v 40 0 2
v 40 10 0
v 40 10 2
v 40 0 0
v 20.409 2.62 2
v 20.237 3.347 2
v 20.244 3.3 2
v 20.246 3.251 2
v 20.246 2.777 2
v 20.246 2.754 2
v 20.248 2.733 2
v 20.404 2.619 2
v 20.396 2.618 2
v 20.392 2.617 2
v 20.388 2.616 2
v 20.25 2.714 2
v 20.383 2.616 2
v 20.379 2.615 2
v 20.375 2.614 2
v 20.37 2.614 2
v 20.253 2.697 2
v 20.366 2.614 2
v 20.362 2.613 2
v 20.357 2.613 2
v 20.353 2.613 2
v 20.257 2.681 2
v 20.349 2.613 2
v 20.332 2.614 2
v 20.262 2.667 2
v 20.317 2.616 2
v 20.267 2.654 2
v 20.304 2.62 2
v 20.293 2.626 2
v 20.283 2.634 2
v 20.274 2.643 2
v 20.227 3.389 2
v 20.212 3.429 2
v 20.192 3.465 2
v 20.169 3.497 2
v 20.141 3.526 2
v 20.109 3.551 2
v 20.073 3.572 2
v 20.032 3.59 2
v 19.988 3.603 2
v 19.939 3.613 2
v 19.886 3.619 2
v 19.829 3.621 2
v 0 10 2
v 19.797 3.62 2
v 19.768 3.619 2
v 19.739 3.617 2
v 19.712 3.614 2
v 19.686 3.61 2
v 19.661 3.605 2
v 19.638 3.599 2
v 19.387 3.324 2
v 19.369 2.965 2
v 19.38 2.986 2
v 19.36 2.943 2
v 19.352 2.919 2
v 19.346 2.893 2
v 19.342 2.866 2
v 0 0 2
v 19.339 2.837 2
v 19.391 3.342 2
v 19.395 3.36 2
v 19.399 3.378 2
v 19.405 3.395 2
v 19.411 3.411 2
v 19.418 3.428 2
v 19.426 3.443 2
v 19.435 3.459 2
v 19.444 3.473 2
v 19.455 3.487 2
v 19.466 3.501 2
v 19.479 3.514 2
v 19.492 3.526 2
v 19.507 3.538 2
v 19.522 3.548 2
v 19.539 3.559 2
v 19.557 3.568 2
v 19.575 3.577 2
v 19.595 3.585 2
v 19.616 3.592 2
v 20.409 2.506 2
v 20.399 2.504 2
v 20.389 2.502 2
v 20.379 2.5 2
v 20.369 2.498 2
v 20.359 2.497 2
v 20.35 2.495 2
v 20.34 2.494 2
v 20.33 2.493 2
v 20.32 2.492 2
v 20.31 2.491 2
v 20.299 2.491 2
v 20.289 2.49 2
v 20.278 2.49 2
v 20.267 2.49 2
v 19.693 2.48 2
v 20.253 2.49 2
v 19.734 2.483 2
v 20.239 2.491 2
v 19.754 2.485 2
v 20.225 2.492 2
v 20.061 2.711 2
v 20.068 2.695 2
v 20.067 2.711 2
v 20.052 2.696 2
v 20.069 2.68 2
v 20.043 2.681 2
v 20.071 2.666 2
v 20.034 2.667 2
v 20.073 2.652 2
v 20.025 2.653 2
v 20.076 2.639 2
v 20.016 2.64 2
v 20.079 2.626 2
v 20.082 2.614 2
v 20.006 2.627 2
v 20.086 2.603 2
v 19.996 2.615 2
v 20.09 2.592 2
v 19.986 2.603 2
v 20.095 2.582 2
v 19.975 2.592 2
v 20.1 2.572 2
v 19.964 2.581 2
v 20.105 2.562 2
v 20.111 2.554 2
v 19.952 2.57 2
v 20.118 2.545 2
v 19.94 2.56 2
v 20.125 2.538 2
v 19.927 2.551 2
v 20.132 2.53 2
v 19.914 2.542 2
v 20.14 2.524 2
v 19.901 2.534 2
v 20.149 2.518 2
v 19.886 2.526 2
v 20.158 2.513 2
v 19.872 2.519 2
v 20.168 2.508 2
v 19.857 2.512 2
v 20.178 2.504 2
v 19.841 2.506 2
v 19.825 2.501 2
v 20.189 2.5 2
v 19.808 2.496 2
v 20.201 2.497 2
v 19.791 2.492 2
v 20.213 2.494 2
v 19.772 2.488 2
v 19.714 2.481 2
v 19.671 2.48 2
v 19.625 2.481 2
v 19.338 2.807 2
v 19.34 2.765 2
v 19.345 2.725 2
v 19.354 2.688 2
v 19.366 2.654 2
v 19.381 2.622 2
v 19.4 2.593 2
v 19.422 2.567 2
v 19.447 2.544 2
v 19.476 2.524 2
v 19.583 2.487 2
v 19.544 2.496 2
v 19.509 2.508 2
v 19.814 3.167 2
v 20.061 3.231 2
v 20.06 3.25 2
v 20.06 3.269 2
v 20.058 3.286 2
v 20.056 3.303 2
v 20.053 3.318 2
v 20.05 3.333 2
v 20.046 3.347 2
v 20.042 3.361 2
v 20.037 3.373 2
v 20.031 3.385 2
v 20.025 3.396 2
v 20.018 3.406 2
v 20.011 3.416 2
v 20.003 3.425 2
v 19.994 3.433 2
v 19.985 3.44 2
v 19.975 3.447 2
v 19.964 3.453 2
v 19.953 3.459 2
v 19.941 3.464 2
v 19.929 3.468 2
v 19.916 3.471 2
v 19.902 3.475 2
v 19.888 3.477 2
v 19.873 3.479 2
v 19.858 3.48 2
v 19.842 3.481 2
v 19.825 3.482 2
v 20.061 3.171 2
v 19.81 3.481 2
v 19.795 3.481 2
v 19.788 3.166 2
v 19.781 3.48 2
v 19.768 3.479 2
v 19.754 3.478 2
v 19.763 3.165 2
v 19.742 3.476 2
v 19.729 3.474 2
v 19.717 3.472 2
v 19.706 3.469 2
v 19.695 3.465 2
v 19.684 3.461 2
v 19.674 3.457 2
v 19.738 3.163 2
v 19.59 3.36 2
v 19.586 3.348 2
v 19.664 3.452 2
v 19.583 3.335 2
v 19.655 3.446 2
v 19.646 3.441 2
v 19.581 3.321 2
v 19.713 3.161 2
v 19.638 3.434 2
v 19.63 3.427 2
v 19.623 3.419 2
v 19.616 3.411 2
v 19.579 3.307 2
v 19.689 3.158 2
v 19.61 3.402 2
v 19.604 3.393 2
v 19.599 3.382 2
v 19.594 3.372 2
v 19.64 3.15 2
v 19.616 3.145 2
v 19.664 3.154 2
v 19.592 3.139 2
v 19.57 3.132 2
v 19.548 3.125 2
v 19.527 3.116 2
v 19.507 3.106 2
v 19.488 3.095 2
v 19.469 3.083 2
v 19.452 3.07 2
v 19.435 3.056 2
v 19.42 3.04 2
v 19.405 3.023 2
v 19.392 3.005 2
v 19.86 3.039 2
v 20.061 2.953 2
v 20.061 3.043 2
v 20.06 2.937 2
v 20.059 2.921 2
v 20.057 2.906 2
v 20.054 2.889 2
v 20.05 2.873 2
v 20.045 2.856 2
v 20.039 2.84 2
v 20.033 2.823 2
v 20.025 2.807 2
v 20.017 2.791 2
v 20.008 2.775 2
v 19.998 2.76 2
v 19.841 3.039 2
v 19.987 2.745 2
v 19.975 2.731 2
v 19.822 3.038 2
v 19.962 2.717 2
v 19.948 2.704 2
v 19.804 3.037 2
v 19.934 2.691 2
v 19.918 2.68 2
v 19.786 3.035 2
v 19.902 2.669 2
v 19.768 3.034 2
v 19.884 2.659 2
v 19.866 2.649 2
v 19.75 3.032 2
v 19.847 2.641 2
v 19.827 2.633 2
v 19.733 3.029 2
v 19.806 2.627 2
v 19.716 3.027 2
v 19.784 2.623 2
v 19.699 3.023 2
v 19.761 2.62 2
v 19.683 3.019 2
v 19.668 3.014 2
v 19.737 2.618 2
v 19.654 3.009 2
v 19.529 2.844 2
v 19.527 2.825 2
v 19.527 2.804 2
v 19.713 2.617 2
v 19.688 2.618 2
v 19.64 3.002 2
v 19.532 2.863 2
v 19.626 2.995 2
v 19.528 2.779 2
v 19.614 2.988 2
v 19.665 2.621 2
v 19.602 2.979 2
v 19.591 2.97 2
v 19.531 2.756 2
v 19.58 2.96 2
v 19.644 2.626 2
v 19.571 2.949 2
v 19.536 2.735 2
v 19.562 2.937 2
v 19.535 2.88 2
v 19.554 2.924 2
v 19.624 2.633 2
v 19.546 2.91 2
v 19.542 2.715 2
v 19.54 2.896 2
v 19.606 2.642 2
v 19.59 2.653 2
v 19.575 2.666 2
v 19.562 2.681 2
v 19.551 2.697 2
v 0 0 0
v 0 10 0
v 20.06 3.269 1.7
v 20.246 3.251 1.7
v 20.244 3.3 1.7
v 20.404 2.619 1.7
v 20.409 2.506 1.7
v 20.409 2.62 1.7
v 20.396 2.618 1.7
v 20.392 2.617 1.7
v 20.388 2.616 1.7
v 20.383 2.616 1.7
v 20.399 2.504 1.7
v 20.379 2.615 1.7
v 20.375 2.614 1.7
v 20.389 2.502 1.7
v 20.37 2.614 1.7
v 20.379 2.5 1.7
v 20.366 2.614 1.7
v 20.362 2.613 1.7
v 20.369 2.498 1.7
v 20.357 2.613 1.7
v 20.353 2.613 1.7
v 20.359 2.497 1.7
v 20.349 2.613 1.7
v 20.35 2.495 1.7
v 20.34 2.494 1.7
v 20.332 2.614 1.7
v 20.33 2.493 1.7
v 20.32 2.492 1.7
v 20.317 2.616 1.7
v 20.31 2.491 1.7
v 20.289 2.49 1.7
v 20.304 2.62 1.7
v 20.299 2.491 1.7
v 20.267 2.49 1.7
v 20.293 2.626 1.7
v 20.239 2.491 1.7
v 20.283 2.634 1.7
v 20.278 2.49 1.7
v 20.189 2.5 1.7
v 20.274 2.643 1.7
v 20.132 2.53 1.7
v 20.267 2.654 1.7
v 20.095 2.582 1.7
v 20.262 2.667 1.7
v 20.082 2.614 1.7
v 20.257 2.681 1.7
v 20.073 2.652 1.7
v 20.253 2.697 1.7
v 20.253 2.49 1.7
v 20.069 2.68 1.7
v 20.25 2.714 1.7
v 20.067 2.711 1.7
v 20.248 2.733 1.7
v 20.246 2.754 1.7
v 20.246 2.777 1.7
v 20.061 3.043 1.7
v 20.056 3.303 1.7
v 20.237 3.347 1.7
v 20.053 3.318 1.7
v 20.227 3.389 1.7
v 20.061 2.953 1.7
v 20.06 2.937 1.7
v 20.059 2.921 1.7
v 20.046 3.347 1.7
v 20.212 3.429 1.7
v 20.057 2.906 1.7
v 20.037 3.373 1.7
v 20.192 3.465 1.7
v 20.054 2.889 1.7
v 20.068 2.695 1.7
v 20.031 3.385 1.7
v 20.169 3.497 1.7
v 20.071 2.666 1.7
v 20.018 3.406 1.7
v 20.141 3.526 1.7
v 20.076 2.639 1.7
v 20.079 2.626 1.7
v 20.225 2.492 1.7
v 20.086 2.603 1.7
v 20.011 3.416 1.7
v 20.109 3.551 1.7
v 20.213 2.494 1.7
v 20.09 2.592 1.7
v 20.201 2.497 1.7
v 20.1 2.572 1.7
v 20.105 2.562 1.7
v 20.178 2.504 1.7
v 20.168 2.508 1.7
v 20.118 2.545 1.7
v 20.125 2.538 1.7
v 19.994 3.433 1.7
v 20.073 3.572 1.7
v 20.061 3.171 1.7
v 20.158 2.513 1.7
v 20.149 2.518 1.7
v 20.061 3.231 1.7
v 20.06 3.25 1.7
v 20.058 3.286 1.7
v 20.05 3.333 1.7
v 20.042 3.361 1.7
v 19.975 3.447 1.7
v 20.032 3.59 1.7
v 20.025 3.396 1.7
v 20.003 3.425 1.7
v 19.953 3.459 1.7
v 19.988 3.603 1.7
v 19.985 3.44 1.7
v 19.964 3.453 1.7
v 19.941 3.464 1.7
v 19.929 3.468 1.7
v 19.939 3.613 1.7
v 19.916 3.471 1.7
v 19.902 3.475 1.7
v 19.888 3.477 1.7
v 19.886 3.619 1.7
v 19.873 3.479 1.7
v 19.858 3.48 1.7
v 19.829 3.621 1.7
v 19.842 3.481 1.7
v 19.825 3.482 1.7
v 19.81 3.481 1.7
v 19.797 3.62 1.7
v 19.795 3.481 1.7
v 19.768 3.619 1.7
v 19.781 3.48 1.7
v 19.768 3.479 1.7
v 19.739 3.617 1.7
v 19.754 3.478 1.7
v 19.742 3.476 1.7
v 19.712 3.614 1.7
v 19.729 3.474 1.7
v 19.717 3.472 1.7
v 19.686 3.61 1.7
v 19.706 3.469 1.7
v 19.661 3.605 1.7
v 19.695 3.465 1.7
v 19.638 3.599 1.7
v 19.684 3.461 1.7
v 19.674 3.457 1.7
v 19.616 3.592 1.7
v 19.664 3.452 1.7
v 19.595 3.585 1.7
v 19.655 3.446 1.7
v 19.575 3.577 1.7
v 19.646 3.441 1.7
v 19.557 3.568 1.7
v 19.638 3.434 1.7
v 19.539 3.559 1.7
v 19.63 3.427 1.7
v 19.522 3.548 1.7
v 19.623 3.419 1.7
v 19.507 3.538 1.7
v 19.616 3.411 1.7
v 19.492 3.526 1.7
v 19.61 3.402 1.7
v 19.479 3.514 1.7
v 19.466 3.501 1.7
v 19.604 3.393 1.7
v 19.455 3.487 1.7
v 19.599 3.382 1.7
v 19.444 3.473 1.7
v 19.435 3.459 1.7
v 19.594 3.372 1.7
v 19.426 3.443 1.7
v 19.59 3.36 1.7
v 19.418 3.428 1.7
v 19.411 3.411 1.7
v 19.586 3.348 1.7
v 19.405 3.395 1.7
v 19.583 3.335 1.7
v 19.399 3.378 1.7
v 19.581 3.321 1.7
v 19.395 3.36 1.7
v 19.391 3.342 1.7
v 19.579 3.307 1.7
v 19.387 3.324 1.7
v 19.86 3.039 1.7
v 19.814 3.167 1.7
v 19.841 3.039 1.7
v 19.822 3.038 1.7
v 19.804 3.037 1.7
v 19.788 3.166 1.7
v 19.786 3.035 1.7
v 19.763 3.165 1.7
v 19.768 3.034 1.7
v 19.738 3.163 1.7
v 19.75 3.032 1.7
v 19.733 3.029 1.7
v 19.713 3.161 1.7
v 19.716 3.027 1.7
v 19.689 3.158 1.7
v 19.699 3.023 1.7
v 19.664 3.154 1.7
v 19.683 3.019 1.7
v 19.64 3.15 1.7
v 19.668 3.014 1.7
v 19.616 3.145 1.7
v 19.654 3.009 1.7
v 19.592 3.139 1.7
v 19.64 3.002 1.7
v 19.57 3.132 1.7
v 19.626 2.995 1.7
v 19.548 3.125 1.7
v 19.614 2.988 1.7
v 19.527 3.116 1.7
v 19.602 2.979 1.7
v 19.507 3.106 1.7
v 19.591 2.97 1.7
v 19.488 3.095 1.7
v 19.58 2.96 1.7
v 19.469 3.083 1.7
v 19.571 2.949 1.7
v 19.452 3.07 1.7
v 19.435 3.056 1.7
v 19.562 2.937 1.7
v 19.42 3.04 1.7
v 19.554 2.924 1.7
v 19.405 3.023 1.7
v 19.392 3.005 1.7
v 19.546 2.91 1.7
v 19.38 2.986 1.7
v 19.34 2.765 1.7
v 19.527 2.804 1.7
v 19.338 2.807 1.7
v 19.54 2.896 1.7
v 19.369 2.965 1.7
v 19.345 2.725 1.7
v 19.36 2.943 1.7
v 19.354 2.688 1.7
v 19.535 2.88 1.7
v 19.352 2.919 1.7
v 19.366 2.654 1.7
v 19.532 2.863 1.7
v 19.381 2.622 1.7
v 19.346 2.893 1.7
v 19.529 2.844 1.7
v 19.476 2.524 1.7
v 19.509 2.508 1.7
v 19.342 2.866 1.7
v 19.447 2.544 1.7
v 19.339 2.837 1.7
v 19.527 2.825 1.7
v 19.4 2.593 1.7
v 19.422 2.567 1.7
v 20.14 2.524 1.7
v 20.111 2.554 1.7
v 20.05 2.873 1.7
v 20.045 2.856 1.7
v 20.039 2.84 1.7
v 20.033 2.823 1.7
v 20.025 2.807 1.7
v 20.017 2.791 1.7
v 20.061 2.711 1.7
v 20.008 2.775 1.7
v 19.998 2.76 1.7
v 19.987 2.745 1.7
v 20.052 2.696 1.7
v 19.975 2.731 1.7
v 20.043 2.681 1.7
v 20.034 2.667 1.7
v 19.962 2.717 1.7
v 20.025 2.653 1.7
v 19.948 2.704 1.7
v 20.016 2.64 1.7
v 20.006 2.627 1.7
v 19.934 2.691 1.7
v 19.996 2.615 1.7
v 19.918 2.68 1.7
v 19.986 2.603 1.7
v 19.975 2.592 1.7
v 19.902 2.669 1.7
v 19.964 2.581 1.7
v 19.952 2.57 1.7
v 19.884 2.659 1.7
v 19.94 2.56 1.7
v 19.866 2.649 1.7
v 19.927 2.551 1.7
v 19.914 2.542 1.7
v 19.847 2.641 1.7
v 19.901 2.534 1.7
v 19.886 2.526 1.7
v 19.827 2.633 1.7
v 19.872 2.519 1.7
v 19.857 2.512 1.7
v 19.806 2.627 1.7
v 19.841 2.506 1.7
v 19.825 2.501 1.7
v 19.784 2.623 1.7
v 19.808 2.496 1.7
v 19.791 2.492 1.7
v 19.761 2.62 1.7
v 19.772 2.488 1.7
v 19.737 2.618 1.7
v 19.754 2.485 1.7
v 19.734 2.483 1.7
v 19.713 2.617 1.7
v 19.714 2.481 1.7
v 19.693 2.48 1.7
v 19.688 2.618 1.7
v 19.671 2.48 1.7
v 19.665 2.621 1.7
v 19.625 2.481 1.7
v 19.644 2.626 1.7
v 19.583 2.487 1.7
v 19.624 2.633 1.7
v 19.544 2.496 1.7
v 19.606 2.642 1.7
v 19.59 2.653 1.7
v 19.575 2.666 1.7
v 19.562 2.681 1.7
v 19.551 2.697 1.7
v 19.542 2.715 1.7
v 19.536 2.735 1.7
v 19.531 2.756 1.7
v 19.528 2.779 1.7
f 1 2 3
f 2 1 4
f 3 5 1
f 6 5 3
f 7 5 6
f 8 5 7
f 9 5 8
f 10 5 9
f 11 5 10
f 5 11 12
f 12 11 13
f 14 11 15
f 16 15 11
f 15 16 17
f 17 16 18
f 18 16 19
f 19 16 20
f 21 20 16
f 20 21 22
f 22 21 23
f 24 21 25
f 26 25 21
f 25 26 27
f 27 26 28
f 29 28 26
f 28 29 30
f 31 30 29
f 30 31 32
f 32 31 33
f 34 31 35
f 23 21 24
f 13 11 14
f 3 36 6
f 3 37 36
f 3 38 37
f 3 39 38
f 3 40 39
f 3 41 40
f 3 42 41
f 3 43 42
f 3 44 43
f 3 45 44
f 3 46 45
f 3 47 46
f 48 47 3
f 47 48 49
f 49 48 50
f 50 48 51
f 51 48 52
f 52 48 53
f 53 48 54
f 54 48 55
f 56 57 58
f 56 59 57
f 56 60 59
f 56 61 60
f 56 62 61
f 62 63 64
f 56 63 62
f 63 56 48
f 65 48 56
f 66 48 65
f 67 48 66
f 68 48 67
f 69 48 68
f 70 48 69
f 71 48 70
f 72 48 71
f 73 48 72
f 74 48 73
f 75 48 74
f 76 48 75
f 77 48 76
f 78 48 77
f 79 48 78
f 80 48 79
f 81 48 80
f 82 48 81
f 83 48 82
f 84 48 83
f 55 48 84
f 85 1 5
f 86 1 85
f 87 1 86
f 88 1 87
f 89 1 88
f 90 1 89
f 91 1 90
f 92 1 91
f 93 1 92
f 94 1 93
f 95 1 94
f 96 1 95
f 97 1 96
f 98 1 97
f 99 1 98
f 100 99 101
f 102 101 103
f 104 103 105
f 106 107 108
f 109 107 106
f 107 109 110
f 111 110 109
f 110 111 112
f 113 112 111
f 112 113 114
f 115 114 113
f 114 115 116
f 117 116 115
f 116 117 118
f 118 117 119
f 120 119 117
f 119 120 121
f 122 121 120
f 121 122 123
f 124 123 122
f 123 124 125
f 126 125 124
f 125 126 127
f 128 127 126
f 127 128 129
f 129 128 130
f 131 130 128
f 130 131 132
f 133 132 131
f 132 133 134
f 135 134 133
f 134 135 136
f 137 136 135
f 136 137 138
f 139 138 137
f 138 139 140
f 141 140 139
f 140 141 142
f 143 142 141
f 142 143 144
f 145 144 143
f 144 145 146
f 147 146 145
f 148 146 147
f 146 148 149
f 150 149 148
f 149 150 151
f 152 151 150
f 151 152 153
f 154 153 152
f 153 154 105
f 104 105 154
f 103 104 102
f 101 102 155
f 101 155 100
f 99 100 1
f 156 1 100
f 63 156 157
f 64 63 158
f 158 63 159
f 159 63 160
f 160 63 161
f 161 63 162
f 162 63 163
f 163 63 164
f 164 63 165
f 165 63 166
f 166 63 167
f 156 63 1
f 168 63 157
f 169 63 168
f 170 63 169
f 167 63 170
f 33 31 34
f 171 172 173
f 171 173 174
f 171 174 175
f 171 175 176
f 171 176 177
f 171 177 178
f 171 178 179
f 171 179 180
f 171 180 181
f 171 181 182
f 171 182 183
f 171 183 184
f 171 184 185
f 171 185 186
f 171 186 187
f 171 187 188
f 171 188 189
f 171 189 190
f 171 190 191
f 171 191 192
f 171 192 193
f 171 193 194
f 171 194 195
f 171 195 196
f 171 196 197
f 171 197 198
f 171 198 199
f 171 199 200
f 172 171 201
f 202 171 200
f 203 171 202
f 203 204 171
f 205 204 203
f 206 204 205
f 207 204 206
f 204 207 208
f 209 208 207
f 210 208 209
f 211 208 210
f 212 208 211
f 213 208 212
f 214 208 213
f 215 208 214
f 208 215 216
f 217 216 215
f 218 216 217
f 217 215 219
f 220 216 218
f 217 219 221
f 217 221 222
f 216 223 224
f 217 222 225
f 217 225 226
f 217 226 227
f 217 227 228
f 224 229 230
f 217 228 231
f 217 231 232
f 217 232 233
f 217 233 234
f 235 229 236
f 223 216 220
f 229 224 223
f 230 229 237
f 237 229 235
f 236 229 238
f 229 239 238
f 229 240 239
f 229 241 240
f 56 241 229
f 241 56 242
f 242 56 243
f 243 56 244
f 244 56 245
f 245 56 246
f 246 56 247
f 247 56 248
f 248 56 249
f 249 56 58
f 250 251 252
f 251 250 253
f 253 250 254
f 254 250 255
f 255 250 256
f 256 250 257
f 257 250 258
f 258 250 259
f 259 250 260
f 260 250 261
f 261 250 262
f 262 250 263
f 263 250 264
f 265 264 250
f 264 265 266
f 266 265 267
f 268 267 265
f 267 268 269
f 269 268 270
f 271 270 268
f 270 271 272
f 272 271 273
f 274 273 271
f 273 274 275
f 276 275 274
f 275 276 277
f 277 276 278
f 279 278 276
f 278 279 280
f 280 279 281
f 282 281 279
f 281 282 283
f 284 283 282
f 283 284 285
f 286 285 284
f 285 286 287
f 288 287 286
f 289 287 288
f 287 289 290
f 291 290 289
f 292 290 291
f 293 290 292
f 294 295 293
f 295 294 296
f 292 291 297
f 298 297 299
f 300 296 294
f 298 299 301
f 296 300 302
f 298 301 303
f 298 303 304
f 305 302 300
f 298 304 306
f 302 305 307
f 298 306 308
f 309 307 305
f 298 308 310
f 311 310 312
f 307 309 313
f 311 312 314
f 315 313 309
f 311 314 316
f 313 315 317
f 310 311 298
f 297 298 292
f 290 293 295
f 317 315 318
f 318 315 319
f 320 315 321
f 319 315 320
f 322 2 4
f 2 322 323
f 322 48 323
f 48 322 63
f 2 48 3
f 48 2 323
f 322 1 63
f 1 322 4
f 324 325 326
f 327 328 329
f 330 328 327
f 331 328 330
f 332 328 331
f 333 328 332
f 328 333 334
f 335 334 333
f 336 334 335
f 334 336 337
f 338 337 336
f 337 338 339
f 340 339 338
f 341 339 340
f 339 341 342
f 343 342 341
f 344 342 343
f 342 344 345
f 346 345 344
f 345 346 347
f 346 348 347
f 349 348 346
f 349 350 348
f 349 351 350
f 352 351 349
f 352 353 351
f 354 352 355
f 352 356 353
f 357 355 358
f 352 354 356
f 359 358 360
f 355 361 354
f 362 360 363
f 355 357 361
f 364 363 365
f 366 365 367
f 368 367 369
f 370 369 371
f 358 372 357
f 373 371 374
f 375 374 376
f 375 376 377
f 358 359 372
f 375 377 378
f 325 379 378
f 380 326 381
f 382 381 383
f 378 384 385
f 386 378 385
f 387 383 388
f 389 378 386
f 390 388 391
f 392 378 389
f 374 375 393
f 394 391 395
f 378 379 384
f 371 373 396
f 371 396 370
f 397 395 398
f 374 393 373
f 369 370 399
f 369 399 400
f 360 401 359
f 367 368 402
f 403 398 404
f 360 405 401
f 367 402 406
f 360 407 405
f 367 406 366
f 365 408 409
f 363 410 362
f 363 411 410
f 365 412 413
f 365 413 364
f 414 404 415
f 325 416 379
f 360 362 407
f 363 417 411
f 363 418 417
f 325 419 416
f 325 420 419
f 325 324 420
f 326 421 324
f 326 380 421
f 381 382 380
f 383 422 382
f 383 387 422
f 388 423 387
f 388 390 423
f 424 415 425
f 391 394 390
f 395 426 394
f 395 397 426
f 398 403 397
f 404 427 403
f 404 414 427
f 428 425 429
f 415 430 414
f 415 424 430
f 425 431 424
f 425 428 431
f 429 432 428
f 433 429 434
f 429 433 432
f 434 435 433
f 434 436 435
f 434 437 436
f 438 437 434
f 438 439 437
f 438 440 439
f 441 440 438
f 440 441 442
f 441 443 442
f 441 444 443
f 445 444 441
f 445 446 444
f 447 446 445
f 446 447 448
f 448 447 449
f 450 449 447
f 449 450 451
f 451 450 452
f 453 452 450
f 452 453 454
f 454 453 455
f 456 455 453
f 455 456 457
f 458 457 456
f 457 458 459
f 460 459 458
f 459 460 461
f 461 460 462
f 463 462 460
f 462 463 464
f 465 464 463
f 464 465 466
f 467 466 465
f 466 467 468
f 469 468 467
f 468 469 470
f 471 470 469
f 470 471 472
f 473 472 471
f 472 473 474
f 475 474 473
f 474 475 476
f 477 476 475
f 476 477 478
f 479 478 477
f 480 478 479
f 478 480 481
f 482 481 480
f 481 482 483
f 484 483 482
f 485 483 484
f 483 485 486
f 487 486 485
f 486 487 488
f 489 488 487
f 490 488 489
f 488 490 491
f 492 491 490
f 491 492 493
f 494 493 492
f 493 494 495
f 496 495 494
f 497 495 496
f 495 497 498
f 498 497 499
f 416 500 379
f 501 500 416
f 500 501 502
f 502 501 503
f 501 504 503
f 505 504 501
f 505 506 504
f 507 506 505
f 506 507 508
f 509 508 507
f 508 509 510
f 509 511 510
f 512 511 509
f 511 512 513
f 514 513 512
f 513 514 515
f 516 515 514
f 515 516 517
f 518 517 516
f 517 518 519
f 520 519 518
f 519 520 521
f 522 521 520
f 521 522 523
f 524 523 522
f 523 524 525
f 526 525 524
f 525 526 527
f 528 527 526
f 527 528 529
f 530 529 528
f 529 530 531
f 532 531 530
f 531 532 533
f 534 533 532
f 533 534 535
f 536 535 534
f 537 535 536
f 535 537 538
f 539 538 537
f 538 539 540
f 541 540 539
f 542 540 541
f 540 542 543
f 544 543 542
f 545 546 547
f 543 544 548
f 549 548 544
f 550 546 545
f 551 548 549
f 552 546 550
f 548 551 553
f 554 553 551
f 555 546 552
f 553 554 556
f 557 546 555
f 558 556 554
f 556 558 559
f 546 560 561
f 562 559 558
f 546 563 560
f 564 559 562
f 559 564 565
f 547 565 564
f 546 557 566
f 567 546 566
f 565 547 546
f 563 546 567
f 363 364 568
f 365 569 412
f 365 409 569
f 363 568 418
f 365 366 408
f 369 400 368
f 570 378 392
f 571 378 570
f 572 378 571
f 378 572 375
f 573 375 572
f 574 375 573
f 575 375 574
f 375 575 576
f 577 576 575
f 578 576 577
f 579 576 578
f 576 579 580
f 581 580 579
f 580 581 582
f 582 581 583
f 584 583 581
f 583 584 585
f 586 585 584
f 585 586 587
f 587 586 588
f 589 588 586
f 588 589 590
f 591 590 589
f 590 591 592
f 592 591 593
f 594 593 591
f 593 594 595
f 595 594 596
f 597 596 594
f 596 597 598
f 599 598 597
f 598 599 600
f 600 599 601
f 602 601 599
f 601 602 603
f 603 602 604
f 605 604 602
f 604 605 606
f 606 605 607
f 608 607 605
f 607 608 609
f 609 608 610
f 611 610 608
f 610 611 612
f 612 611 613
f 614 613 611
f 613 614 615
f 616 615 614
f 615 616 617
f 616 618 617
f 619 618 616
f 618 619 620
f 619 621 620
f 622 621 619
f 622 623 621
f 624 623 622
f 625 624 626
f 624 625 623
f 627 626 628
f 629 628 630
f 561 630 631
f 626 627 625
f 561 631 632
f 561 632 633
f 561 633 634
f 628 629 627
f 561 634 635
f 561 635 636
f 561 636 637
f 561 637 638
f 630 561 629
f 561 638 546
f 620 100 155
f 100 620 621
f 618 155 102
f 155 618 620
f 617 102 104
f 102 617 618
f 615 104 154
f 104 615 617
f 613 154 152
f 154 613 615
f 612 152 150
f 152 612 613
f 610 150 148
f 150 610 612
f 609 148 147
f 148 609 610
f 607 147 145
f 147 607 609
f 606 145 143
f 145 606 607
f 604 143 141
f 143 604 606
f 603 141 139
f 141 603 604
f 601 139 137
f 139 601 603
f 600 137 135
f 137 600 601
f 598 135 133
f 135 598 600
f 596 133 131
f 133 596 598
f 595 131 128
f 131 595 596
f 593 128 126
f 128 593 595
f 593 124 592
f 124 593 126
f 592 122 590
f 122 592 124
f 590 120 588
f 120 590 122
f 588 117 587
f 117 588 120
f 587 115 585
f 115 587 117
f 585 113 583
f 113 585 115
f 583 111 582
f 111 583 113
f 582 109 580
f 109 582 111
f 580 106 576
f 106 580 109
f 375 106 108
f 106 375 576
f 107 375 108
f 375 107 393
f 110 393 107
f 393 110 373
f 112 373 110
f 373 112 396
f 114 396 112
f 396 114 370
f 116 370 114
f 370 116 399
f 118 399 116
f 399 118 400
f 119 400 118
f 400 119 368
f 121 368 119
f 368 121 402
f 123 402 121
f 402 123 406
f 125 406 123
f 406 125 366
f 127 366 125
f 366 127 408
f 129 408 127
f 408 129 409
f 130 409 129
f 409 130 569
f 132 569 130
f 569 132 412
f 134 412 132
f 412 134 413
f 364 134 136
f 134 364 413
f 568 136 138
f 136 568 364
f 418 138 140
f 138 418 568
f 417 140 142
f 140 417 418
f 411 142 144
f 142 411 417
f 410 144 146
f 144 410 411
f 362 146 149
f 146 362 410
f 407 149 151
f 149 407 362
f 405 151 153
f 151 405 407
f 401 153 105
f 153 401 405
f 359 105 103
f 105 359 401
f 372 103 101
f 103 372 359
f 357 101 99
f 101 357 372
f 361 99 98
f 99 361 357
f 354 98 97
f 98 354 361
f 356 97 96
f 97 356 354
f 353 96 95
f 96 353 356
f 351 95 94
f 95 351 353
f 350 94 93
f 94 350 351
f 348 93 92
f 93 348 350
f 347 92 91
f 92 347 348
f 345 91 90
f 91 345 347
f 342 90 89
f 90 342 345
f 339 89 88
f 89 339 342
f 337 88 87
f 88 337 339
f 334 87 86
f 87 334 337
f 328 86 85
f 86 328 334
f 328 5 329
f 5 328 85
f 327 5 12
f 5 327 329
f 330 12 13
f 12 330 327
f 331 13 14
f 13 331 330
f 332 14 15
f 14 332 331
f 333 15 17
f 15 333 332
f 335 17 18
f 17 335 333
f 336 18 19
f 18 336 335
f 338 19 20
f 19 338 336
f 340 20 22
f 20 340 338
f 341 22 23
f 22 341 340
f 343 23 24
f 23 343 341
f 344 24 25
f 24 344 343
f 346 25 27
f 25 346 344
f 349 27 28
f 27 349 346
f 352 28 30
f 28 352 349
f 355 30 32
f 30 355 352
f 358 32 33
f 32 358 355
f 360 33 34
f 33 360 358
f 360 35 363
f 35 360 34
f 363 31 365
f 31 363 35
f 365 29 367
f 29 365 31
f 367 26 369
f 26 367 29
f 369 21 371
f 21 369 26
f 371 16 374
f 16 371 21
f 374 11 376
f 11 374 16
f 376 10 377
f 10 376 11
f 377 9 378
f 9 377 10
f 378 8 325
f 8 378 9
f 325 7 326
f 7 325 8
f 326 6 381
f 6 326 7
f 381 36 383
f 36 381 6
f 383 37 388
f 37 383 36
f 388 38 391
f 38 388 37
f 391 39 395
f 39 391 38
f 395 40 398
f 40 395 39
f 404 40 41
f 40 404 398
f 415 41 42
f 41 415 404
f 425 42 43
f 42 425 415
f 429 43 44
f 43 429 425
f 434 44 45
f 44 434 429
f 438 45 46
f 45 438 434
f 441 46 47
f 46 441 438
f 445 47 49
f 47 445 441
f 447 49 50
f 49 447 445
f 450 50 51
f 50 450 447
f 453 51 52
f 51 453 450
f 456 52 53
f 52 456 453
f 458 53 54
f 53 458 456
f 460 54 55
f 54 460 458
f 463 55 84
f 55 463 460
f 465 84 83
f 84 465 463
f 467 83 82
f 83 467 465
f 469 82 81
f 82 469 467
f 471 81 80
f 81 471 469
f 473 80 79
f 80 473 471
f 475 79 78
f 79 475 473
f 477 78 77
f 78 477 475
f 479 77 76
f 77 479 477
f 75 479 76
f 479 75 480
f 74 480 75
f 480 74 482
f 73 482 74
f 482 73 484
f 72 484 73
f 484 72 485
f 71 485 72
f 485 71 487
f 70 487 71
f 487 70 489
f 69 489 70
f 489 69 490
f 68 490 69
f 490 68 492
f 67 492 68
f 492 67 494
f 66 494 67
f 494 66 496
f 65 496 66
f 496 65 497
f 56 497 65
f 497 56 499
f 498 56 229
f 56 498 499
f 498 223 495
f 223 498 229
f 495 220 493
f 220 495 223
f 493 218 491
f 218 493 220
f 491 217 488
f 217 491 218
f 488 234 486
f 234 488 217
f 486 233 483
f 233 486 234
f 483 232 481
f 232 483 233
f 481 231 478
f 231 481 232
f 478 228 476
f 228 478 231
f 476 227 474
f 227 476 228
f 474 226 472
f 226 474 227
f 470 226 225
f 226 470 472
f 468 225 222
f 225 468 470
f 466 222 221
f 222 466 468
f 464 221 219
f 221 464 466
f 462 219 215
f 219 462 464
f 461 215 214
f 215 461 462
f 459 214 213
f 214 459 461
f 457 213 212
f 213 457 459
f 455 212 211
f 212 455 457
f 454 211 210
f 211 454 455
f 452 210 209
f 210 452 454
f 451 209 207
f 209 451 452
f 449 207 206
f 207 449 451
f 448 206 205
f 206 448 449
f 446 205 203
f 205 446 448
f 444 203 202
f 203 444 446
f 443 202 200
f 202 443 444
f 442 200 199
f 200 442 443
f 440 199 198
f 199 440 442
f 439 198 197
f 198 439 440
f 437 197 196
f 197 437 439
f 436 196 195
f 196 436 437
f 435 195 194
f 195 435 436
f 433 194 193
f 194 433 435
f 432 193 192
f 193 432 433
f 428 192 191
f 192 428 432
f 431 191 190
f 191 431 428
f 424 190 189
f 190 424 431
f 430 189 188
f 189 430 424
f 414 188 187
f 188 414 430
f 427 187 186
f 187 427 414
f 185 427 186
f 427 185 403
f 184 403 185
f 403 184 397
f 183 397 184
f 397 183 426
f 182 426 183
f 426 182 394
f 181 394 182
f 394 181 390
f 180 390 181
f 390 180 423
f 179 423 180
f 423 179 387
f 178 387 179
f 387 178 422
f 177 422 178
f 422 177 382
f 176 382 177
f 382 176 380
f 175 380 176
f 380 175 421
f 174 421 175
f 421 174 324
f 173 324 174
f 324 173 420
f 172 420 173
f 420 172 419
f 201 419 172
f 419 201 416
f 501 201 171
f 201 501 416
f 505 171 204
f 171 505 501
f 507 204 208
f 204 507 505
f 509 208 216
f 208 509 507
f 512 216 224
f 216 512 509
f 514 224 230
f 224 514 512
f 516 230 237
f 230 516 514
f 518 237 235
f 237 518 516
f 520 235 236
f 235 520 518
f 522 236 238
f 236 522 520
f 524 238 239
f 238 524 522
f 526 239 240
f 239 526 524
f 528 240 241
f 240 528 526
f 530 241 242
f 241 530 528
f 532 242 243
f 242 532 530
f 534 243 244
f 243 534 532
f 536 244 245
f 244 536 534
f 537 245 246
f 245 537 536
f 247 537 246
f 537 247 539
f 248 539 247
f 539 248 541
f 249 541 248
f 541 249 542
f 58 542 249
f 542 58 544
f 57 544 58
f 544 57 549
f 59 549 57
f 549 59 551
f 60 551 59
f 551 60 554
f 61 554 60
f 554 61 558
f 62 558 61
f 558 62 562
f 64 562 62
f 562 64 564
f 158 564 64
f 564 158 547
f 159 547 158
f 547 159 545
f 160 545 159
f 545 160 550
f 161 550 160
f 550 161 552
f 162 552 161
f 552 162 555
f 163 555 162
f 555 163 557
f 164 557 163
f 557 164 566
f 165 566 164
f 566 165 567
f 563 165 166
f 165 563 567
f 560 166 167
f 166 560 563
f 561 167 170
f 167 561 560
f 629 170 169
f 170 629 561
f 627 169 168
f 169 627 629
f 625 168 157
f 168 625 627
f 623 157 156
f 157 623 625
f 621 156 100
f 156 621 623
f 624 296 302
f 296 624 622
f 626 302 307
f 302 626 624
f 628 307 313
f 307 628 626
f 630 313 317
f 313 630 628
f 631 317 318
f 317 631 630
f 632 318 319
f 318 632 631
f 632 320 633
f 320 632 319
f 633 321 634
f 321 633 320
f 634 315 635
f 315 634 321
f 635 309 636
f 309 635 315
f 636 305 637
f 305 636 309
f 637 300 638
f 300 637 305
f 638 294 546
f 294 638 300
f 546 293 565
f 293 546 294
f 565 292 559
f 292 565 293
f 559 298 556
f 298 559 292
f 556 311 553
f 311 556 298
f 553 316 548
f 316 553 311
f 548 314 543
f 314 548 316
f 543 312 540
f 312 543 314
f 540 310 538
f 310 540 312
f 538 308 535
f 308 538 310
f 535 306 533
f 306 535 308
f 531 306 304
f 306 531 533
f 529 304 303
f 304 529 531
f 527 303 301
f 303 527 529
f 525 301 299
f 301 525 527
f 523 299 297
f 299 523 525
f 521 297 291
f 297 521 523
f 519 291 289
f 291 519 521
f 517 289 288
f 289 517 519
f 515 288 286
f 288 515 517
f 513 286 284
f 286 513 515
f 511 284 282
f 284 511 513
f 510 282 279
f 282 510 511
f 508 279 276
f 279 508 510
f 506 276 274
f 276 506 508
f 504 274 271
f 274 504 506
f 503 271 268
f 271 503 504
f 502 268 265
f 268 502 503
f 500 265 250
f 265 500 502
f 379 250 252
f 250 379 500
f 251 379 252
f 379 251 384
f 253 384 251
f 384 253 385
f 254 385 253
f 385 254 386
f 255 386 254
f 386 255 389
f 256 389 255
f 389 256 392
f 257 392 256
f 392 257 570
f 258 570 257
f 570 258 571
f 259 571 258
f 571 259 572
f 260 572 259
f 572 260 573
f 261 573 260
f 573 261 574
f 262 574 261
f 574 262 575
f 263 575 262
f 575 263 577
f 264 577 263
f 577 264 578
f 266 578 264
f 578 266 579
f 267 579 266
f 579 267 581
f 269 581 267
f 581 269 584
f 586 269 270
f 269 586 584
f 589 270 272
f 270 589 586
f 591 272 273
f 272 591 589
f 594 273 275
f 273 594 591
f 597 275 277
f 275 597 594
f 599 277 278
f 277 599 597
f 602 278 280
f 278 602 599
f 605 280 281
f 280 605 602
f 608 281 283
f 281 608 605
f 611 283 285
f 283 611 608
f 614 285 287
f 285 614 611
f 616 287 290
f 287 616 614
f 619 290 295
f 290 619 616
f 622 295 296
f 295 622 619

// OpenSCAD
// engrave-recess.scad
// benchmark family: engrave-recess
// purpose: text cut into a base plate via difference(), at the sourced
//   depth values (0.3 mm and 0.5 mm per evid-feat-003, evid-engrave-001)
//   and base thicknesses, sized so the remaining wall after the cut is
//   deliberately below and above the 0.8 mm ctr-wall-001 floor in
//   different models. this is the recessed-engrave counterpart to the
//   raised-text sub-family in feature-ladder.scad.
//
// operation exercised: op-engrave (subtractive, recessed relief).
// the mesh inspector cannot distinguish a deliberate engrave from any
// other concavity. the op declaration is the studio-side record;
// the benchmark demonstrates what the validator sees at the mesh level:
// remaining wall after cut vs ctr-wall-001 (minimum_wall_thickness >= 0.8 mm).
//
// sourced depth values and constraints:
//   recessed max depth 0.50 mm: cooksongold (src-0010, evid-feat-003):
//     "recessed text must be ... no more than 0.50mm deep"
//   recessed max depth 0.50 mm: hoover & strong (src-0007, evid-engrave-001):
//     "maximum depth of 0.5mm ... for all CAD/wax engraving"
//   depth-to-width ratio <= 1:1: materialise (src-0001, evid-engrave-002):
//     "maximum height/depth-to-width ratio of 1:1"
//   depth-to-width ratio <= 2:1: stuller (src-0011, evid-feat-004):
//     "depth of recessed letters can be no more than double the width"
//   remaining wall >= 0.35 mm: materialise (src-0001, evid-engrave-002):
//     "keep in mind the minimum wall thickness of 0.35 mm"
//   engraved depth 0.2-0.3 mm to survive finishing: ecadcam (src-0003, evid-feat-002)
//   letter height >= 1.5 mm for script survival: gildform (src-0019, evid-gildform-engrave-001)
//   minimum wall thickness >= 0.8 mm (generic floor): cooksongold (src-0010, evid-wall-006),
//     stuller (src-0011, evid-wall-007)
//
// model grid (base_mm x depth_mm -> remaining = base_mm - depth_mm):
//   engrave-recess-thin-d0.3 : base 1.0 mm, depth 0.3 mm -> remaining 0.7 mm (below 0.8 mm floor)
//   engrave-recess-thin-d0.5 : base 1.0 mm, depth 0.5 mm -> remaining 0.5 mm (below 0.8 mm floor)
//   engrave-recess-safe-d0.3 : base 2.0 mm, depth 0.3 mm -> remaining 1.7 mm (above 0.8 mm floor)
//   engrave-recess-safe-d0.5 : base 2.0 mm, depth 0.5 mm -> remaining 1.5 mm (above 0.8 mm floor)
//
// letter height: 1.5 mm (gildform evid-gildform-engrave-001; sculpteo rule-digest minimum)
// font: Liberation Sans (bundled with openscad 2021.01 docker image; confirmed headless-safe)

/* [engrave-recess parameters] */
// base plate thickness in mm before engraving
// thin base (1.0 mm): remaining wall < 0.8 mm for either depth -> ctr-wall-001 fires
// safe base (2.0 mm): remaining wall >= 1.5 mm for either depth -> ctr-wall-001 passes
base_mm = 2.0;    // default: safe base

// engraving depth in mm
// 0.3 mm: ecadcam shallow floor (evid-feat-002) and cooksongold lower end (evid-feat-003)
// 0.5 mm: cooksongold max (evid-feat-003) and hoover & strong max (evid-engrave-001)
depth_mm = 0.3;   // default: shallow depth

// plate footprint in mm
plate_x = 40;   // value unverified, sized to fit letter and margins
plate_y = 10;   // value unverified

// letter height: 1.5 mm (gildform evid-gildform-engrave-001; also sculpteo minimum)
letter_h = 1.5;

// font: Liberation Sans - bundled with openscad 2021.01 docker image
text_font = "Liberation Sans";

/* [Hidden] */
$fn = 48;

// plate with text recessed by difference()
// the engraving is a single "a" glyph centered on the plate face.
// depth_mm sets the recess depth; remaining wall = base_mm - depth_mm.
difference() {
    cube([plate_x, plate_y, base_mm]);
    // glyph cut: translate to mid-plate, push cut down from top surface
    translate([plate_x / 2 - letter_h / 2, plate_y / 4, base_mm - depth_mm])
        linear_extrude(height = depth_mm + 0.01)
            text("a", size = letter_h, font = text_font,
                 halign = "left", valign = "baseline");
}
